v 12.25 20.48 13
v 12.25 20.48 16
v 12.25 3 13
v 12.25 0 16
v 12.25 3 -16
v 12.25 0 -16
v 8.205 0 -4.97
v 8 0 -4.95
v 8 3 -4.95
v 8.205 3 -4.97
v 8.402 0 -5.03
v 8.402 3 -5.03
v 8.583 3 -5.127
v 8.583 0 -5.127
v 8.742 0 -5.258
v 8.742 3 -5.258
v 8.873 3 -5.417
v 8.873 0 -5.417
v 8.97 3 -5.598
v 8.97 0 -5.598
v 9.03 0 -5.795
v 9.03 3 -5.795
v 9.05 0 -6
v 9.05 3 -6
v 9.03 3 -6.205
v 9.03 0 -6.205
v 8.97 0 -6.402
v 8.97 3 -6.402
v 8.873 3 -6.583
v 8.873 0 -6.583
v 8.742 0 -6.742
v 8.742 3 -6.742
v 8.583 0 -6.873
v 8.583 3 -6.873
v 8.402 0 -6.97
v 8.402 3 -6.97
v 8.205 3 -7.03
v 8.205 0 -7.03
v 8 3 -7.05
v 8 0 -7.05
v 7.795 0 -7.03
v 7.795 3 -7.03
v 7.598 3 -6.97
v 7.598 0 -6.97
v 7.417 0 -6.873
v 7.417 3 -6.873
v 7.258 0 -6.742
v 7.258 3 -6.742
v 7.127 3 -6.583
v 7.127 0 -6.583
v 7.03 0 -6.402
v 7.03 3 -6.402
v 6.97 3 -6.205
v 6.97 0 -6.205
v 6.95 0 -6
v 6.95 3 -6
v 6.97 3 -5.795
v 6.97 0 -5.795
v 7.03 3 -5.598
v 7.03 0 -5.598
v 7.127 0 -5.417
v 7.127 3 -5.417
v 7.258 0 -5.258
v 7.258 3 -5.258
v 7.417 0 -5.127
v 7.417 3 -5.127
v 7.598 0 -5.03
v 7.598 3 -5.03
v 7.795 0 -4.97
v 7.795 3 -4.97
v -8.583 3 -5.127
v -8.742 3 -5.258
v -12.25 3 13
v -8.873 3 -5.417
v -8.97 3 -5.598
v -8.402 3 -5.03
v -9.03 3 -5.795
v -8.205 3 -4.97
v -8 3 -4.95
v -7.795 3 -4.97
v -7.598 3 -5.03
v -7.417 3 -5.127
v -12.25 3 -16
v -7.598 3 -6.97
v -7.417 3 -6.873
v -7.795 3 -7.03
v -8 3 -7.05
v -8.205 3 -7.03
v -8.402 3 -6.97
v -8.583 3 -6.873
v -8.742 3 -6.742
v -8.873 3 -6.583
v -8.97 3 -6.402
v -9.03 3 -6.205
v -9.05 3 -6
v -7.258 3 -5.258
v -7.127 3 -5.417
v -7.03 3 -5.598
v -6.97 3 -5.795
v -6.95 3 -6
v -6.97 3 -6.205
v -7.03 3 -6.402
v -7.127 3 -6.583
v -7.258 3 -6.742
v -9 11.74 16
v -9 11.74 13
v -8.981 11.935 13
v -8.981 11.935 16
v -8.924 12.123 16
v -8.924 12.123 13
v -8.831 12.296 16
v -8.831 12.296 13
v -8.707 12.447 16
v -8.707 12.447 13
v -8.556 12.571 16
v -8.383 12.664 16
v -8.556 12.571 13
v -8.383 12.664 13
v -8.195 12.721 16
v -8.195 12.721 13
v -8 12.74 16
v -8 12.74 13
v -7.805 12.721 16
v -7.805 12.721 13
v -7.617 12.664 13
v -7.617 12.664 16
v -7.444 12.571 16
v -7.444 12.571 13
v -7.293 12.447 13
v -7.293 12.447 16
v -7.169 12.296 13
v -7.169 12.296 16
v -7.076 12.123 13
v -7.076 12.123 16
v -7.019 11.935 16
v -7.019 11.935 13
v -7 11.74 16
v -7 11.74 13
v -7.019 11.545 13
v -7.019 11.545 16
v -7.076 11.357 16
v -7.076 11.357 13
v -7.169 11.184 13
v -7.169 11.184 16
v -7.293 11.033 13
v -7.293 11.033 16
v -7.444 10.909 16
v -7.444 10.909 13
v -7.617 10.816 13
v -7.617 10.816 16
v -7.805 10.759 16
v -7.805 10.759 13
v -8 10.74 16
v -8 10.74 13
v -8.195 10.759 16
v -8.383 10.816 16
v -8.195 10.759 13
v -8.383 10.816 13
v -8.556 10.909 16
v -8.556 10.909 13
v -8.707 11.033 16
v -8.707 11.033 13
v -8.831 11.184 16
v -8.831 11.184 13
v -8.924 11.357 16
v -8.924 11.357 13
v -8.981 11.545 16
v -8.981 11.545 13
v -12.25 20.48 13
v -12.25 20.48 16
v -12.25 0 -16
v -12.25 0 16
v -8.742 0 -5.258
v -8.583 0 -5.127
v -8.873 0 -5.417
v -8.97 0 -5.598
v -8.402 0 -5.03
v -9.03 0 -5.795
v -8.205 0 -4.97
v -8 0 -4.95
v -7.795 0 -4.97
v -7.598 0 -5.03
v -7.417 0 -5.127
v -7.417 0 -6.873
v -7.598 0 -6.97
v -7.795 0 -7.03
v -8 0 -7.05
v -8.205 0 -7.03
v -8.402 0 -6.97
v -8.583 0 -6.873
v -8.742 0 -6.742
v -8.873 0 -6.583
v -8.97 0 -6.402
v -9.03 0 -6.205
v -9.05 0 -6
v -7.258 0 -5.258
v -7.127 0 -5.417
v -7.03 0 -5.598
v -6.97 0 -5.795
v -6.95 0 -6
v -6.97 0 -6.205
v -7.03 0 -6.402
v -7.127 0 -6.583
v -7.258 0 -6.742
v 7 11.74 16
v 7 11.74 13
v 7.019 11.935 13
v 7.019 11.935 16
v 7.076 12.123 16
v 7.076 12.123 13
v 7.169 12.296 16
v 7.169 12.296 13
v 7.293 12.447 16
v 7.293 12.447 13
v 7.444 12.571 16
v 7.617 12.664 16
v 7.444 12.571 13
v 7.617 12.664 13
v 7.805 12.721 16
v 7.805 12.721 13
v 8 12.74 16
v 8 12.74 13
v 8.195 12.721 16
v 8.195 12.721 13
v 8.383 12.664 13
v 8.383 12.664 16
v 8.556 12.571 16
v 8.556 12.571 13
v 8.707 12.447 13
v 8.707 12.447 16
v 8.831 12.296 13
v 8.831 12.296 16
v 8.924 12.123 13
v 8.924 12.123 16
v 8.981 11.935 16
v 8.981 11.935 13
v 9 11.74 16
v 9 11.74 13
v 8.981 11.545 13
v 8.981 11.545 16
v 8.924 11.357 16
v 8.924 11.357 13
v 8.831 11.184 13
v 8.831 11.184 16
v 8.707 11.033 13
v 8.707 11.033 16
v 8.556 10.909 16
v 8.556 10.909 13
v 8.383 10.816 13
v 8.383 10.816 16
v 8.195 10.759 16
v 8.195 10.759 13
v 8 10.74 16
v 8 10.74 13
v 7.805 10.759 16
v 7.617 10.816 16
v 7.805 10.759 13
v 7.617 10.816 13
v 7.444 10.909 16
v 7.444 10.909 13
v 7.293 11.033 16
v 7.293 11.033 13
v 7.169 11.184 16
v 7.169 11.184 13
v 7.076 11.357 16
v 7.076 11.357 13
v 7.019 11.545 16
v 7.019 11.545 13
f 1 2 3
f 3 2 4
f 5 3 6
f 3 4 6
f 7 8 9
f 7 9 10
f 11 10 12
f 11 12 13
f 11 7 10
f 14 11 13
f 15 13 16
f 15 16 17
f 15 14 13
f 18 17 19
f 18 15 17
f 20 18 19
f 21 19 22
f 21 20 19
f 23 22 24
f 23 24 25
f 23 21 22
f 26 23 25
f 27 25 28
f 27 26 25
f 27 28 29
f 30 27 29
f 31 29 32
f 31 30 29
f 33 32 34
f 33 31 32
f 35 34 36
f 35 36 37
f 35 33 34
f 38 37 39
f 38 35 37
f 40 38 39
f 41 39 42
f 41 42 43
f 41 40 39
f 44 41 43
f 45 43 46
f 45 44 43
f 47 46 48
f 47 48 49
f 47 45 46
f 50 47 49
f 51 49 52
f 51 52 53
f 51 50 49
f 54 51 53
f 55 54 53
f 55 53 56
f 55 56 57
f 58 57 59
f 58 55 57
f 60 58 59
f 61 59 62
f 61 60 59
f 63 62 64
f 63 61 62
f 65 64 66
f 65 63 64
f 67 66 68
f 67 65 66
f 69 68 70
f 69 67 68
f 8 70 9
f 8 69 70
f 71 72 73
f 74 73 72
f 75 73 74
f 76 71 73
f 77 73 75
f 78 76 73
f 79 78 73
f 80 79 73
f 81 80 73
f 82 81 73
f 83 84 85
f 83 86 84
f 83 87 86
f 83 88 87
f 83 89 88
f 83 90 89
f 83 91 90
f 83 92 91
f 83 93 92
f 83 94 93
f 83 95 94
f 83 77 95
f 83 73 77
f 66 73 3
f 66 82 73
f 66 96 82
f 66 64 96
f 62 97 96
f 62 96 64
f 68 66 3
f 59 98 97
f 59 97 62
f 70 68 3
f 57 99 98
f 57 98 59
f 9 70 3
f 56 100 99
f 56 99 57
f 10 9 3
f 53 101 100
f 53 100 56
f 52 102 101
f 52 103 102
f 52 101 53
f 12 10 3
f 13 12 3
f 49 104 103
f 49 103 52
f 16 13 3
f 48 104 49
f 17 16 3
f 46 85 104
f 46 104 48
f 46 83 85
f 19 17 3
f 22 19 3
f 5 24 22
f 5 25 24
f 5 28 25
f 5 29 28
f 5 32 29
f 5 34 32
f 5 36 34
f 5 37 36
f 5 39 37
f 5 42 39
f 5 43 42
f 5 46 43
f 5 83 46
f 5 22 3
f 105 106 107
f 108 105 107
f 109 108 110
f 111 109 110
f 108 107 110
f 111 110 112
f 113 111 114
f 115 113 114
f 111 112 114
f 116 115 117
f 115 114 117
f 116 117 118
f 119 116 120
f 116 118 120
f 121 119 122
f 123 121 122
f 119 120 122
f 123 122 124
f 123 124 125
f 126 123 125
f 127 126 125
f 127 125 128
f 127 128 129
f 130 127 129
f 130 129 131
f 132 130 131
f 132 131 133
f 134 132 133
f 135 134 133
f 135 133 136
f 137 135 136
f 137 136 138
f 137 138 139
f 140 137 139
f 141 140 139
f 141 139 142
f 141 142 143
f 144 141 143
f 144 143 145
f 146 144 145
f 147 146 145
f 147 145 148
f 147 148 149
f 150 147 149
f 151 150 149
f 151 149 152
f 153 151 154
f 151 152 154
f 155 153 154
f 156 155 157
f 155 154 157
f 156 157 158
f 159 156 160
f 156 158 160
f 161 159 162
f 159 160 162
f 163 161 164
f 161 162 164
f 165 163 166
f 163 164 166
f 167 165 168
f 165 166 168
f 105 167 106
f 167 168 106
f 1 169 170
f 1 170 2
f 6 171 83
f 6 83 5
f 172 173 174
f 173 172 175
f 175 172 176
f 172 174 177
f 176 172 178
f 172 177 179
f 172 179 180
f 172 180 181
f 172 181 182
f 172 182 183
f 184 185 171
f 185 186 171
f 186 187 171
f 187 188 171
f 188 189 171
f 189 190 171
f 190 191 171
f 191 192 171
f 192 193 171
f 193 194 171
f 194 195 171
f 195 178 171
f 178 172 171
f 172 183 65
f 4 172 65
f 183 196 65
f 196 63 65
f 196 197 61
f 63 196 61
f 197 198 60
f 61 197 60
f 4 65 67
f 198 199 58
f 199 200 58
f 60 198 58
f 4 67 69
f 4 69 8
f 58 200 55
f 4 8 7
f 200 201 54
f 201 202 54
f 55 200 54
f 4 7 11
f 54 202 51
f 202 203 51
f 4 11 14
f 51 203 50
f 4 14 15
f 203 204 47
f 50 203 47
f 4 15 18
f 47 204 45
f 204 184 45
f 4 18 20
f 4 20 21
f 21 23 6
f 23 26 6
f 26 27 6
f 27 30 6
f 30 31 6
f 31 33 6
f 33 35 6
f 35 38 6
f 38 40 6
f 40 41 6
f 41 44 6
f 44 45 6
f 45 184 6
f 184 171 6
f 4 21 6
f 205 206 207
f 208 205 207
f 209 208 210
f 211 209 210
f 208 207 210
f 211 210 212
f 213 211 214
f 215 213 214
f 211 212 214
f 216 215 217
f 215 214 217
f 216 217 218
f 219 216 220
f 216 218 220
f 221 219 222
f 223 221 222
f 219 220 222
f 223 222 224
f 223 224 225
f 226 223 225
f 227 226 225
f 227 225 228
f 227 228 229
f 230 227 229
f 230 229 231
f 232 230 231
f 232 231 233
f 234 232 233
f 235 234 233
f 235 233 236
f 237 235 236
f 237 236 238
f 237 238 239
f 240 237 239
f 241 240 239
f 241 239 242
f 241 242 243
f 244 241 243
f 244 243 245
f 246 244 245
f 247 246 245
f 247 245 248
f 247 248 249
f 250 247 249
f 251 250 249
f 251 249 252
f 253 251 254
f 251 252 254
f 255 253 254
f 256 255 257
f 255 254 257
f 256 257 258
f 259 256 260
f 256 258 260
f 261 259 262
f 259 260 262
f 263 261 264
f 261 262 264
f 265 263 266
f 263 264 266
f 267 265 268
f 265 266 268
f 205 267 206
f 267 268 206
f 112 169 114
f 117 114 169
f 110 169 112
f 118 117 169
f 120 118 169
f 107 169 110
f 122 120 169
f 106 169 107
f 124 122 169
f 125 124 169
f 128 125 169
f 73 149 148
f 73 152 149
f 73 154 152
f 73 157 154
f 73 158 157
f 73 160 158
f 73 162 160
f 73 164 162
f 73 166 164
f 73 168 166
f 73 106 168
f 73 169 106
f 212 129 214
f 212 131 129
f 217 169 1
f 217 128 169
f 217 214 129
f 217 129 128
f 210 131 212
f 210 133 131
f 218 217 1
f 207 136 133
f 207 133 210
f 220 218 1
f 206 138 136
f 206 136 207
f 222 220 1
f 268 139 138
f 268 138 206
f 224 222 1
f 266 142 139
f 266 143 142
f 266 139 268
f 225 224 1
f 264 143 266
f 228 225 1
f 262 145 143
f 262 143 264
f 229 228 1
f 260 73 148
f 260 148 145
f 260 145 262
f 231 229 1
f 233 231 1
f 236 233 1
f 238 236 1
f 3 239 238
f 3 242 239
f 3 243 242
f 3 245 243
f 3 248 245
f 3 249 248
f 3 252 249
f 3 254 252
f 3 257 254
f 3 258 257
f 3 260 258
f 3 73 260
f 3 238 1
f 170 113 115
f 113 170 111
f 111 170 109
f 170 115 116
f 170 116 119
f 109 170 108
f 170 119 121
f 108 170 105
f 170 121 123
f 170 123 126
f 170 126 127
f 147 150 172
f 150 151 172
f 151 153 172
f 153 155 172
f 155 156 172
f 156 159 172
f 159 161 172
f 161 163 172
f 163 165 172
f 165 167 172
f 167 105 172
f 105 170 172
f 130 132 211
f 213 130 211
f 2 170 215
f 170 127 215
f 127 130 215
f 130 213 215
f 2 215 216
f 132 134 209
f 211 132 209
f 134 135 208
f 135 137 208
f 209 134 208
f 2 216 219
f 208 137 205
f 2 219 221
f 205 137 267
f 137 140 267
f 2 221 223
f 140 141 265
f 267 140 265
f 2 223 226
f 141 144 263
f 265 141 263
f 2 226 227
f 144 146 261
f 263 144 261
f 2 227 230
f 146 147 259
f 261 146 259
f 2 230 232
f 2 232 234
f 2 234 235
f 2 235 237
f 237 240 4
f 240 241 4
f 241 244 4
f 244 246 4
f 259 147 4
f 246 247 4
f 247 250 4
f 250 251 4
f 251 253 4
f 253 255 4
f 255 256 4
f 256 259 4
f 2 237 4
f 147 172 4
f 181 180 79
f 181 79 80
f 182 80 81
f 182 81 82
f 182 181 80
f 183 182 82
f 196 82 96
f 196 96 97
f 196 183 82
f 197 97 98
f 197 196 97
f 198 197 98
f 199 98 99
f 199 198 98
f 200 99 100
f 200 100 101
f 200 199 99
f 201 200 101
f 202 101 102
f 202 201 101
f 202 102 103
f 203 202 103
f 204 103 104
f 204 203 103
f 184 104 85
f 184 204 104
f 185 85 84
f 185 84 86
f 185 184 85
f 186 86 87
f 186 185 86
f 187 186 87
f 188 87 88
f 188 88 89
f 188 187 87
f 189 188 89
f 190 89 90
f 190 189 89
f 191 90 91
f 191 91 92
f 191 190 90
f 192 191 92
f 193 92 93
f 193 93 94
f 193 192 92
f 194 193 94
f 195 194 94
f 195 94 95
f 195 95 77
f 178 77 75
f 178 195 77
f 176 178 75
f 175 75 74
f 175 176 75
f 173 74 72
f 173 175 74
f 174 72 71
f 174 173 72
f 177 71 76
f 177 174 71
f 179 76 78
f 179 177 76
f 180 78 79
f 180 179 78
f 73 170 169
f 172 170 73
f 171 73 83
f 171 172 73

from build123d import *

# Parameters (mm, degrees)
SKETCH1_W           = 24.5
SKETCH1_H           = 32
SKETCH1_R           = 1.05
BOSS_EXTRUDE1_DEPTH = 3
SKETCH3_W           = 24.5
SKETCH3_H           = 3
BOSS_EXTRUDE3_DEPTH = 17.48
SKETCH4_R           = 1
CUT_EXTRUDE1_DEPTH  = 10


with BuildPart() as part:
    # Sketch1 → Boss-Extrude1 (new body)
    with BuildSketch(Plane(origin=(0, 0, 0), x_dir=(1, 0, 0), z_dir=(0, 1, 0))):
        Rectangle(SKETCH1_W, SKETCH1_H)
        with Locations(Location((8, 6, 0), (0, 0, 270))):
            Circle(SKETCH1_R, mode=Mode.SUBTRACT)
        with Locations(Location((-8, 6, 0), (0, 0, 270))):
            Circle(SKETCH1_R, mode=Mode.SUBTRACT)
    extrude(amount=BOSS_EXTRUDE1_DEPTH)

    # Sketch3 → Boss-Extrude3 (add)
    with BuildSketch(Plane(origin=(0, 3, 0), x_dir=(1, 0, 0), z_dir=(0, 1, 0))):
        with Locations((0, -14.5)):
            Rectangle(SKETCH3_W, SKETCH3_H)
    extrude(amount=BOSS_EXTRUDE3_DEPTH)

    # Sketch4 → Cut-Extrude1 (cut)
    with BuildSketch(Plane(origin=(0, 0, 13), x_dir=(-1, 0, 0), z_dir=(0, 0, -1))):
        with Locations((8, 11.74)):
            Circle(SKETCH4_R)
        with Locations((-8, 11.74)):
            Circle(SKETCH4_R)
    extrude(amount=-CUT_EXTRUDE1_DEPTH, mode=Mode.SUBTRACT)


solid = part.part
